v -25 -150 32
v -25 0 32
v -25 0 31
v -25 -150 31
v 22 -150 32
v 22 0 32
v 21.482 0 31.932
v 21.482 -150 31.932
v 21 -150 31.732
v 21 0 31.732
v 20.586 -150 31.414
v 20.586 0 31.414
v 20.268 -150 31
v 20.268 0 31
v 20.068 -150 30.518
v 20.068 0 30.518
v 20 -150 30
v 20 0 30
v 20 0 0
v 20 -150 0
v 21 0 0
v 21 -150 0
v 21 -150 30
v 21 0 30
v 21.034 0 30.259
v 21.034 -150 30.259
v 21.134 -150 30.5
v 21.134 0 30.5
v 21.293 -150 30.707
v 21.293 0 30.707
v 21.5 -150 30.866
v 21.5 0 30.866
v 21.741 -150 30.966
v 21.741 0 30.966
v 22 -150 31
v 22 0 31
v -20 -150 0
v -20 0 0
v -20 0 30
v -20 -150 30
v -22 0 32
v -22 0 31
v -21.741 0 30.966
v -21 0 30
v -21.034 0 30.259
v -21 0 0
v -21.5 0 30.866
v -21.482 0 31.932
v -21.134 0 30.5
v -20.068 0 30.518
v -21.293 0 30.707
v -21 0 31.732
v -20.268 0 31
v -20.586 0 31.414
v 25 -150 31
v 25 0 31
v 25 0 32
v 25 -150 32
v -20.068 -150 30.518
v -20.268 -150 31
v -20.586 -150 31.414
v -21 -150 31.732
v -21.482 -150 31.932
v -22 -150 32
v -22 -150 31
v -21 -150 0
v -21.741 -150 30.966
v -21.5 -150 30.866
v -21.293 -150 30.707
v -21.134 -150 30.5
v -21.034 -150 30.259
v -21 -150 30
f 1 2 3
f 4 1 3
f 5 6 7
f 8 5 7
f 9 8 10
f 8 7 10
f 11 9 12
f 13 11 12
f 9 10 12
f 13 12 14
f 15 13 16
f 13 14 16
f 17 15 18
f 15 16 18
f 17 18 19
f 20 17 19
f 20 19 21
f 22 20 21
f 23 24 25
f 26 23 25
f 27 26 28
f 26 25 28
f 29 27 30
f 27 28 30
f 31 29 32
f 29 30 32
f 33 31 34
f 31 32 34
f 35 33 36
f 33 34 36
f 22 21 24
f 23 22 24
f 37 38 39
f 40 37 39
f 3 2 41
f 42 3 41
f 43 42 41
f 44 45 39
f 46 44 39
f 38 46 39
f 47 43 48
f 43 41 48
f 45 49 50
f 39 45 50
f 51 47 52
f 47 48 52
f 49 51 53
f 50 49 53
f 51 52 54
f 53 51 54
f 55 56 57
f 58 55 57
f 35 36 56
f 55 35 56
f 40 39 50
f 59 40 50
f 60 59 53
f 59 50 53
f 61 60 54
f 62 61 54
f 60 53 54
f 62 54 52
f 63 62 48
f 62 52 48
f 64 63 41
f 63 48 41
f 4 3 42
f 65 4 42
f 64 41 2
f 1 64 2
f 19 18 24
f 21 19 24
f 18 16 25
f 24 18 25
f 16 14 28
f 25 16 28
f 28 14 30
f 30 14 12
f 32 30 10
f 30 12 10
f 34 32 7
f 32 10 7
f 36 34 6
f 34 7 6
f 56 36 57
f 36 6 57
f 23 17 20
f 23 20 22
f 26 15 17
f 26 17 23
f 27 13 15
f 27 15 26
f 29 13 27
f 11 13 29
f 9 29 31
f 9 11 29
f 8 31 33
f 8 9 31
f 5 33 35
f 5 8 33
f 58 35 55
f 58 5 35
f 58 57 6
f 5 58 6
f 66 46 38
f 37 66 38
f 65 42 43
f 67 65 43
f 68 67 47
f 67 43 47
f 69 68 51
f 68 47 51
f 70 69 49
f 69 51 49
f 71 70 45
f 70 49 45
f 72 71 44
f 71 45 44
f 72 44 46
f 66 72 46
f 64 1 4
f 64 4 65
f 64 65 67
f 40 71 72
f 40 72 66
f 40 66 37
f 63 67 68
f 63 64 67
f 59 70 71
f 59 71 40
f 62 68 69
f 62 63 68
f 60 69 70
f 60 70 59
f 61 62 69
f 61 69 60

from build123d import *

# Parameters (mm, degrees)
F1_DEPTH = 150


with BuildPart() as f1:
    # F0 (on Front) → F1 (new body)
    with BuildSketch(Plane.XZ):
        with BuildLine():
            ThreePointArc((21, 30), (21.292893, 30.707107), (22, 31))
            Line((22, 31), (25, 31))
            Line((25, 31), (25, 32))
            Line((25, 32), (22, 32))
            ThreePointArc((22, 32), (20.585786, 31.414214), (20, 30))
            Line((20, 30), (20, 0))
            Line((20, 0), (21, 0))
            Line((21, 0), (21, 30))
        make_face()
        with BuildLine():
            Line((-22, 32), (-25, 32))
            Line((-25, 32), (-25, 31))
            Line((-25, 31), (-22, 31))
            ThreePointArc((-22, 31), (-21.292893, 30.707107), (-21, 30))
            Line((-21, 30), (-21, 0))
            Line((-21, 0), (-20, 0))
            Line((-20, 0), (-20, 30))
            ThreePointArc((-20, 30), (-20.585786, 31.414214), (-22, 32))
        make_face()
    extrude(amount=F1_DEPTH)


solid = f1.part
